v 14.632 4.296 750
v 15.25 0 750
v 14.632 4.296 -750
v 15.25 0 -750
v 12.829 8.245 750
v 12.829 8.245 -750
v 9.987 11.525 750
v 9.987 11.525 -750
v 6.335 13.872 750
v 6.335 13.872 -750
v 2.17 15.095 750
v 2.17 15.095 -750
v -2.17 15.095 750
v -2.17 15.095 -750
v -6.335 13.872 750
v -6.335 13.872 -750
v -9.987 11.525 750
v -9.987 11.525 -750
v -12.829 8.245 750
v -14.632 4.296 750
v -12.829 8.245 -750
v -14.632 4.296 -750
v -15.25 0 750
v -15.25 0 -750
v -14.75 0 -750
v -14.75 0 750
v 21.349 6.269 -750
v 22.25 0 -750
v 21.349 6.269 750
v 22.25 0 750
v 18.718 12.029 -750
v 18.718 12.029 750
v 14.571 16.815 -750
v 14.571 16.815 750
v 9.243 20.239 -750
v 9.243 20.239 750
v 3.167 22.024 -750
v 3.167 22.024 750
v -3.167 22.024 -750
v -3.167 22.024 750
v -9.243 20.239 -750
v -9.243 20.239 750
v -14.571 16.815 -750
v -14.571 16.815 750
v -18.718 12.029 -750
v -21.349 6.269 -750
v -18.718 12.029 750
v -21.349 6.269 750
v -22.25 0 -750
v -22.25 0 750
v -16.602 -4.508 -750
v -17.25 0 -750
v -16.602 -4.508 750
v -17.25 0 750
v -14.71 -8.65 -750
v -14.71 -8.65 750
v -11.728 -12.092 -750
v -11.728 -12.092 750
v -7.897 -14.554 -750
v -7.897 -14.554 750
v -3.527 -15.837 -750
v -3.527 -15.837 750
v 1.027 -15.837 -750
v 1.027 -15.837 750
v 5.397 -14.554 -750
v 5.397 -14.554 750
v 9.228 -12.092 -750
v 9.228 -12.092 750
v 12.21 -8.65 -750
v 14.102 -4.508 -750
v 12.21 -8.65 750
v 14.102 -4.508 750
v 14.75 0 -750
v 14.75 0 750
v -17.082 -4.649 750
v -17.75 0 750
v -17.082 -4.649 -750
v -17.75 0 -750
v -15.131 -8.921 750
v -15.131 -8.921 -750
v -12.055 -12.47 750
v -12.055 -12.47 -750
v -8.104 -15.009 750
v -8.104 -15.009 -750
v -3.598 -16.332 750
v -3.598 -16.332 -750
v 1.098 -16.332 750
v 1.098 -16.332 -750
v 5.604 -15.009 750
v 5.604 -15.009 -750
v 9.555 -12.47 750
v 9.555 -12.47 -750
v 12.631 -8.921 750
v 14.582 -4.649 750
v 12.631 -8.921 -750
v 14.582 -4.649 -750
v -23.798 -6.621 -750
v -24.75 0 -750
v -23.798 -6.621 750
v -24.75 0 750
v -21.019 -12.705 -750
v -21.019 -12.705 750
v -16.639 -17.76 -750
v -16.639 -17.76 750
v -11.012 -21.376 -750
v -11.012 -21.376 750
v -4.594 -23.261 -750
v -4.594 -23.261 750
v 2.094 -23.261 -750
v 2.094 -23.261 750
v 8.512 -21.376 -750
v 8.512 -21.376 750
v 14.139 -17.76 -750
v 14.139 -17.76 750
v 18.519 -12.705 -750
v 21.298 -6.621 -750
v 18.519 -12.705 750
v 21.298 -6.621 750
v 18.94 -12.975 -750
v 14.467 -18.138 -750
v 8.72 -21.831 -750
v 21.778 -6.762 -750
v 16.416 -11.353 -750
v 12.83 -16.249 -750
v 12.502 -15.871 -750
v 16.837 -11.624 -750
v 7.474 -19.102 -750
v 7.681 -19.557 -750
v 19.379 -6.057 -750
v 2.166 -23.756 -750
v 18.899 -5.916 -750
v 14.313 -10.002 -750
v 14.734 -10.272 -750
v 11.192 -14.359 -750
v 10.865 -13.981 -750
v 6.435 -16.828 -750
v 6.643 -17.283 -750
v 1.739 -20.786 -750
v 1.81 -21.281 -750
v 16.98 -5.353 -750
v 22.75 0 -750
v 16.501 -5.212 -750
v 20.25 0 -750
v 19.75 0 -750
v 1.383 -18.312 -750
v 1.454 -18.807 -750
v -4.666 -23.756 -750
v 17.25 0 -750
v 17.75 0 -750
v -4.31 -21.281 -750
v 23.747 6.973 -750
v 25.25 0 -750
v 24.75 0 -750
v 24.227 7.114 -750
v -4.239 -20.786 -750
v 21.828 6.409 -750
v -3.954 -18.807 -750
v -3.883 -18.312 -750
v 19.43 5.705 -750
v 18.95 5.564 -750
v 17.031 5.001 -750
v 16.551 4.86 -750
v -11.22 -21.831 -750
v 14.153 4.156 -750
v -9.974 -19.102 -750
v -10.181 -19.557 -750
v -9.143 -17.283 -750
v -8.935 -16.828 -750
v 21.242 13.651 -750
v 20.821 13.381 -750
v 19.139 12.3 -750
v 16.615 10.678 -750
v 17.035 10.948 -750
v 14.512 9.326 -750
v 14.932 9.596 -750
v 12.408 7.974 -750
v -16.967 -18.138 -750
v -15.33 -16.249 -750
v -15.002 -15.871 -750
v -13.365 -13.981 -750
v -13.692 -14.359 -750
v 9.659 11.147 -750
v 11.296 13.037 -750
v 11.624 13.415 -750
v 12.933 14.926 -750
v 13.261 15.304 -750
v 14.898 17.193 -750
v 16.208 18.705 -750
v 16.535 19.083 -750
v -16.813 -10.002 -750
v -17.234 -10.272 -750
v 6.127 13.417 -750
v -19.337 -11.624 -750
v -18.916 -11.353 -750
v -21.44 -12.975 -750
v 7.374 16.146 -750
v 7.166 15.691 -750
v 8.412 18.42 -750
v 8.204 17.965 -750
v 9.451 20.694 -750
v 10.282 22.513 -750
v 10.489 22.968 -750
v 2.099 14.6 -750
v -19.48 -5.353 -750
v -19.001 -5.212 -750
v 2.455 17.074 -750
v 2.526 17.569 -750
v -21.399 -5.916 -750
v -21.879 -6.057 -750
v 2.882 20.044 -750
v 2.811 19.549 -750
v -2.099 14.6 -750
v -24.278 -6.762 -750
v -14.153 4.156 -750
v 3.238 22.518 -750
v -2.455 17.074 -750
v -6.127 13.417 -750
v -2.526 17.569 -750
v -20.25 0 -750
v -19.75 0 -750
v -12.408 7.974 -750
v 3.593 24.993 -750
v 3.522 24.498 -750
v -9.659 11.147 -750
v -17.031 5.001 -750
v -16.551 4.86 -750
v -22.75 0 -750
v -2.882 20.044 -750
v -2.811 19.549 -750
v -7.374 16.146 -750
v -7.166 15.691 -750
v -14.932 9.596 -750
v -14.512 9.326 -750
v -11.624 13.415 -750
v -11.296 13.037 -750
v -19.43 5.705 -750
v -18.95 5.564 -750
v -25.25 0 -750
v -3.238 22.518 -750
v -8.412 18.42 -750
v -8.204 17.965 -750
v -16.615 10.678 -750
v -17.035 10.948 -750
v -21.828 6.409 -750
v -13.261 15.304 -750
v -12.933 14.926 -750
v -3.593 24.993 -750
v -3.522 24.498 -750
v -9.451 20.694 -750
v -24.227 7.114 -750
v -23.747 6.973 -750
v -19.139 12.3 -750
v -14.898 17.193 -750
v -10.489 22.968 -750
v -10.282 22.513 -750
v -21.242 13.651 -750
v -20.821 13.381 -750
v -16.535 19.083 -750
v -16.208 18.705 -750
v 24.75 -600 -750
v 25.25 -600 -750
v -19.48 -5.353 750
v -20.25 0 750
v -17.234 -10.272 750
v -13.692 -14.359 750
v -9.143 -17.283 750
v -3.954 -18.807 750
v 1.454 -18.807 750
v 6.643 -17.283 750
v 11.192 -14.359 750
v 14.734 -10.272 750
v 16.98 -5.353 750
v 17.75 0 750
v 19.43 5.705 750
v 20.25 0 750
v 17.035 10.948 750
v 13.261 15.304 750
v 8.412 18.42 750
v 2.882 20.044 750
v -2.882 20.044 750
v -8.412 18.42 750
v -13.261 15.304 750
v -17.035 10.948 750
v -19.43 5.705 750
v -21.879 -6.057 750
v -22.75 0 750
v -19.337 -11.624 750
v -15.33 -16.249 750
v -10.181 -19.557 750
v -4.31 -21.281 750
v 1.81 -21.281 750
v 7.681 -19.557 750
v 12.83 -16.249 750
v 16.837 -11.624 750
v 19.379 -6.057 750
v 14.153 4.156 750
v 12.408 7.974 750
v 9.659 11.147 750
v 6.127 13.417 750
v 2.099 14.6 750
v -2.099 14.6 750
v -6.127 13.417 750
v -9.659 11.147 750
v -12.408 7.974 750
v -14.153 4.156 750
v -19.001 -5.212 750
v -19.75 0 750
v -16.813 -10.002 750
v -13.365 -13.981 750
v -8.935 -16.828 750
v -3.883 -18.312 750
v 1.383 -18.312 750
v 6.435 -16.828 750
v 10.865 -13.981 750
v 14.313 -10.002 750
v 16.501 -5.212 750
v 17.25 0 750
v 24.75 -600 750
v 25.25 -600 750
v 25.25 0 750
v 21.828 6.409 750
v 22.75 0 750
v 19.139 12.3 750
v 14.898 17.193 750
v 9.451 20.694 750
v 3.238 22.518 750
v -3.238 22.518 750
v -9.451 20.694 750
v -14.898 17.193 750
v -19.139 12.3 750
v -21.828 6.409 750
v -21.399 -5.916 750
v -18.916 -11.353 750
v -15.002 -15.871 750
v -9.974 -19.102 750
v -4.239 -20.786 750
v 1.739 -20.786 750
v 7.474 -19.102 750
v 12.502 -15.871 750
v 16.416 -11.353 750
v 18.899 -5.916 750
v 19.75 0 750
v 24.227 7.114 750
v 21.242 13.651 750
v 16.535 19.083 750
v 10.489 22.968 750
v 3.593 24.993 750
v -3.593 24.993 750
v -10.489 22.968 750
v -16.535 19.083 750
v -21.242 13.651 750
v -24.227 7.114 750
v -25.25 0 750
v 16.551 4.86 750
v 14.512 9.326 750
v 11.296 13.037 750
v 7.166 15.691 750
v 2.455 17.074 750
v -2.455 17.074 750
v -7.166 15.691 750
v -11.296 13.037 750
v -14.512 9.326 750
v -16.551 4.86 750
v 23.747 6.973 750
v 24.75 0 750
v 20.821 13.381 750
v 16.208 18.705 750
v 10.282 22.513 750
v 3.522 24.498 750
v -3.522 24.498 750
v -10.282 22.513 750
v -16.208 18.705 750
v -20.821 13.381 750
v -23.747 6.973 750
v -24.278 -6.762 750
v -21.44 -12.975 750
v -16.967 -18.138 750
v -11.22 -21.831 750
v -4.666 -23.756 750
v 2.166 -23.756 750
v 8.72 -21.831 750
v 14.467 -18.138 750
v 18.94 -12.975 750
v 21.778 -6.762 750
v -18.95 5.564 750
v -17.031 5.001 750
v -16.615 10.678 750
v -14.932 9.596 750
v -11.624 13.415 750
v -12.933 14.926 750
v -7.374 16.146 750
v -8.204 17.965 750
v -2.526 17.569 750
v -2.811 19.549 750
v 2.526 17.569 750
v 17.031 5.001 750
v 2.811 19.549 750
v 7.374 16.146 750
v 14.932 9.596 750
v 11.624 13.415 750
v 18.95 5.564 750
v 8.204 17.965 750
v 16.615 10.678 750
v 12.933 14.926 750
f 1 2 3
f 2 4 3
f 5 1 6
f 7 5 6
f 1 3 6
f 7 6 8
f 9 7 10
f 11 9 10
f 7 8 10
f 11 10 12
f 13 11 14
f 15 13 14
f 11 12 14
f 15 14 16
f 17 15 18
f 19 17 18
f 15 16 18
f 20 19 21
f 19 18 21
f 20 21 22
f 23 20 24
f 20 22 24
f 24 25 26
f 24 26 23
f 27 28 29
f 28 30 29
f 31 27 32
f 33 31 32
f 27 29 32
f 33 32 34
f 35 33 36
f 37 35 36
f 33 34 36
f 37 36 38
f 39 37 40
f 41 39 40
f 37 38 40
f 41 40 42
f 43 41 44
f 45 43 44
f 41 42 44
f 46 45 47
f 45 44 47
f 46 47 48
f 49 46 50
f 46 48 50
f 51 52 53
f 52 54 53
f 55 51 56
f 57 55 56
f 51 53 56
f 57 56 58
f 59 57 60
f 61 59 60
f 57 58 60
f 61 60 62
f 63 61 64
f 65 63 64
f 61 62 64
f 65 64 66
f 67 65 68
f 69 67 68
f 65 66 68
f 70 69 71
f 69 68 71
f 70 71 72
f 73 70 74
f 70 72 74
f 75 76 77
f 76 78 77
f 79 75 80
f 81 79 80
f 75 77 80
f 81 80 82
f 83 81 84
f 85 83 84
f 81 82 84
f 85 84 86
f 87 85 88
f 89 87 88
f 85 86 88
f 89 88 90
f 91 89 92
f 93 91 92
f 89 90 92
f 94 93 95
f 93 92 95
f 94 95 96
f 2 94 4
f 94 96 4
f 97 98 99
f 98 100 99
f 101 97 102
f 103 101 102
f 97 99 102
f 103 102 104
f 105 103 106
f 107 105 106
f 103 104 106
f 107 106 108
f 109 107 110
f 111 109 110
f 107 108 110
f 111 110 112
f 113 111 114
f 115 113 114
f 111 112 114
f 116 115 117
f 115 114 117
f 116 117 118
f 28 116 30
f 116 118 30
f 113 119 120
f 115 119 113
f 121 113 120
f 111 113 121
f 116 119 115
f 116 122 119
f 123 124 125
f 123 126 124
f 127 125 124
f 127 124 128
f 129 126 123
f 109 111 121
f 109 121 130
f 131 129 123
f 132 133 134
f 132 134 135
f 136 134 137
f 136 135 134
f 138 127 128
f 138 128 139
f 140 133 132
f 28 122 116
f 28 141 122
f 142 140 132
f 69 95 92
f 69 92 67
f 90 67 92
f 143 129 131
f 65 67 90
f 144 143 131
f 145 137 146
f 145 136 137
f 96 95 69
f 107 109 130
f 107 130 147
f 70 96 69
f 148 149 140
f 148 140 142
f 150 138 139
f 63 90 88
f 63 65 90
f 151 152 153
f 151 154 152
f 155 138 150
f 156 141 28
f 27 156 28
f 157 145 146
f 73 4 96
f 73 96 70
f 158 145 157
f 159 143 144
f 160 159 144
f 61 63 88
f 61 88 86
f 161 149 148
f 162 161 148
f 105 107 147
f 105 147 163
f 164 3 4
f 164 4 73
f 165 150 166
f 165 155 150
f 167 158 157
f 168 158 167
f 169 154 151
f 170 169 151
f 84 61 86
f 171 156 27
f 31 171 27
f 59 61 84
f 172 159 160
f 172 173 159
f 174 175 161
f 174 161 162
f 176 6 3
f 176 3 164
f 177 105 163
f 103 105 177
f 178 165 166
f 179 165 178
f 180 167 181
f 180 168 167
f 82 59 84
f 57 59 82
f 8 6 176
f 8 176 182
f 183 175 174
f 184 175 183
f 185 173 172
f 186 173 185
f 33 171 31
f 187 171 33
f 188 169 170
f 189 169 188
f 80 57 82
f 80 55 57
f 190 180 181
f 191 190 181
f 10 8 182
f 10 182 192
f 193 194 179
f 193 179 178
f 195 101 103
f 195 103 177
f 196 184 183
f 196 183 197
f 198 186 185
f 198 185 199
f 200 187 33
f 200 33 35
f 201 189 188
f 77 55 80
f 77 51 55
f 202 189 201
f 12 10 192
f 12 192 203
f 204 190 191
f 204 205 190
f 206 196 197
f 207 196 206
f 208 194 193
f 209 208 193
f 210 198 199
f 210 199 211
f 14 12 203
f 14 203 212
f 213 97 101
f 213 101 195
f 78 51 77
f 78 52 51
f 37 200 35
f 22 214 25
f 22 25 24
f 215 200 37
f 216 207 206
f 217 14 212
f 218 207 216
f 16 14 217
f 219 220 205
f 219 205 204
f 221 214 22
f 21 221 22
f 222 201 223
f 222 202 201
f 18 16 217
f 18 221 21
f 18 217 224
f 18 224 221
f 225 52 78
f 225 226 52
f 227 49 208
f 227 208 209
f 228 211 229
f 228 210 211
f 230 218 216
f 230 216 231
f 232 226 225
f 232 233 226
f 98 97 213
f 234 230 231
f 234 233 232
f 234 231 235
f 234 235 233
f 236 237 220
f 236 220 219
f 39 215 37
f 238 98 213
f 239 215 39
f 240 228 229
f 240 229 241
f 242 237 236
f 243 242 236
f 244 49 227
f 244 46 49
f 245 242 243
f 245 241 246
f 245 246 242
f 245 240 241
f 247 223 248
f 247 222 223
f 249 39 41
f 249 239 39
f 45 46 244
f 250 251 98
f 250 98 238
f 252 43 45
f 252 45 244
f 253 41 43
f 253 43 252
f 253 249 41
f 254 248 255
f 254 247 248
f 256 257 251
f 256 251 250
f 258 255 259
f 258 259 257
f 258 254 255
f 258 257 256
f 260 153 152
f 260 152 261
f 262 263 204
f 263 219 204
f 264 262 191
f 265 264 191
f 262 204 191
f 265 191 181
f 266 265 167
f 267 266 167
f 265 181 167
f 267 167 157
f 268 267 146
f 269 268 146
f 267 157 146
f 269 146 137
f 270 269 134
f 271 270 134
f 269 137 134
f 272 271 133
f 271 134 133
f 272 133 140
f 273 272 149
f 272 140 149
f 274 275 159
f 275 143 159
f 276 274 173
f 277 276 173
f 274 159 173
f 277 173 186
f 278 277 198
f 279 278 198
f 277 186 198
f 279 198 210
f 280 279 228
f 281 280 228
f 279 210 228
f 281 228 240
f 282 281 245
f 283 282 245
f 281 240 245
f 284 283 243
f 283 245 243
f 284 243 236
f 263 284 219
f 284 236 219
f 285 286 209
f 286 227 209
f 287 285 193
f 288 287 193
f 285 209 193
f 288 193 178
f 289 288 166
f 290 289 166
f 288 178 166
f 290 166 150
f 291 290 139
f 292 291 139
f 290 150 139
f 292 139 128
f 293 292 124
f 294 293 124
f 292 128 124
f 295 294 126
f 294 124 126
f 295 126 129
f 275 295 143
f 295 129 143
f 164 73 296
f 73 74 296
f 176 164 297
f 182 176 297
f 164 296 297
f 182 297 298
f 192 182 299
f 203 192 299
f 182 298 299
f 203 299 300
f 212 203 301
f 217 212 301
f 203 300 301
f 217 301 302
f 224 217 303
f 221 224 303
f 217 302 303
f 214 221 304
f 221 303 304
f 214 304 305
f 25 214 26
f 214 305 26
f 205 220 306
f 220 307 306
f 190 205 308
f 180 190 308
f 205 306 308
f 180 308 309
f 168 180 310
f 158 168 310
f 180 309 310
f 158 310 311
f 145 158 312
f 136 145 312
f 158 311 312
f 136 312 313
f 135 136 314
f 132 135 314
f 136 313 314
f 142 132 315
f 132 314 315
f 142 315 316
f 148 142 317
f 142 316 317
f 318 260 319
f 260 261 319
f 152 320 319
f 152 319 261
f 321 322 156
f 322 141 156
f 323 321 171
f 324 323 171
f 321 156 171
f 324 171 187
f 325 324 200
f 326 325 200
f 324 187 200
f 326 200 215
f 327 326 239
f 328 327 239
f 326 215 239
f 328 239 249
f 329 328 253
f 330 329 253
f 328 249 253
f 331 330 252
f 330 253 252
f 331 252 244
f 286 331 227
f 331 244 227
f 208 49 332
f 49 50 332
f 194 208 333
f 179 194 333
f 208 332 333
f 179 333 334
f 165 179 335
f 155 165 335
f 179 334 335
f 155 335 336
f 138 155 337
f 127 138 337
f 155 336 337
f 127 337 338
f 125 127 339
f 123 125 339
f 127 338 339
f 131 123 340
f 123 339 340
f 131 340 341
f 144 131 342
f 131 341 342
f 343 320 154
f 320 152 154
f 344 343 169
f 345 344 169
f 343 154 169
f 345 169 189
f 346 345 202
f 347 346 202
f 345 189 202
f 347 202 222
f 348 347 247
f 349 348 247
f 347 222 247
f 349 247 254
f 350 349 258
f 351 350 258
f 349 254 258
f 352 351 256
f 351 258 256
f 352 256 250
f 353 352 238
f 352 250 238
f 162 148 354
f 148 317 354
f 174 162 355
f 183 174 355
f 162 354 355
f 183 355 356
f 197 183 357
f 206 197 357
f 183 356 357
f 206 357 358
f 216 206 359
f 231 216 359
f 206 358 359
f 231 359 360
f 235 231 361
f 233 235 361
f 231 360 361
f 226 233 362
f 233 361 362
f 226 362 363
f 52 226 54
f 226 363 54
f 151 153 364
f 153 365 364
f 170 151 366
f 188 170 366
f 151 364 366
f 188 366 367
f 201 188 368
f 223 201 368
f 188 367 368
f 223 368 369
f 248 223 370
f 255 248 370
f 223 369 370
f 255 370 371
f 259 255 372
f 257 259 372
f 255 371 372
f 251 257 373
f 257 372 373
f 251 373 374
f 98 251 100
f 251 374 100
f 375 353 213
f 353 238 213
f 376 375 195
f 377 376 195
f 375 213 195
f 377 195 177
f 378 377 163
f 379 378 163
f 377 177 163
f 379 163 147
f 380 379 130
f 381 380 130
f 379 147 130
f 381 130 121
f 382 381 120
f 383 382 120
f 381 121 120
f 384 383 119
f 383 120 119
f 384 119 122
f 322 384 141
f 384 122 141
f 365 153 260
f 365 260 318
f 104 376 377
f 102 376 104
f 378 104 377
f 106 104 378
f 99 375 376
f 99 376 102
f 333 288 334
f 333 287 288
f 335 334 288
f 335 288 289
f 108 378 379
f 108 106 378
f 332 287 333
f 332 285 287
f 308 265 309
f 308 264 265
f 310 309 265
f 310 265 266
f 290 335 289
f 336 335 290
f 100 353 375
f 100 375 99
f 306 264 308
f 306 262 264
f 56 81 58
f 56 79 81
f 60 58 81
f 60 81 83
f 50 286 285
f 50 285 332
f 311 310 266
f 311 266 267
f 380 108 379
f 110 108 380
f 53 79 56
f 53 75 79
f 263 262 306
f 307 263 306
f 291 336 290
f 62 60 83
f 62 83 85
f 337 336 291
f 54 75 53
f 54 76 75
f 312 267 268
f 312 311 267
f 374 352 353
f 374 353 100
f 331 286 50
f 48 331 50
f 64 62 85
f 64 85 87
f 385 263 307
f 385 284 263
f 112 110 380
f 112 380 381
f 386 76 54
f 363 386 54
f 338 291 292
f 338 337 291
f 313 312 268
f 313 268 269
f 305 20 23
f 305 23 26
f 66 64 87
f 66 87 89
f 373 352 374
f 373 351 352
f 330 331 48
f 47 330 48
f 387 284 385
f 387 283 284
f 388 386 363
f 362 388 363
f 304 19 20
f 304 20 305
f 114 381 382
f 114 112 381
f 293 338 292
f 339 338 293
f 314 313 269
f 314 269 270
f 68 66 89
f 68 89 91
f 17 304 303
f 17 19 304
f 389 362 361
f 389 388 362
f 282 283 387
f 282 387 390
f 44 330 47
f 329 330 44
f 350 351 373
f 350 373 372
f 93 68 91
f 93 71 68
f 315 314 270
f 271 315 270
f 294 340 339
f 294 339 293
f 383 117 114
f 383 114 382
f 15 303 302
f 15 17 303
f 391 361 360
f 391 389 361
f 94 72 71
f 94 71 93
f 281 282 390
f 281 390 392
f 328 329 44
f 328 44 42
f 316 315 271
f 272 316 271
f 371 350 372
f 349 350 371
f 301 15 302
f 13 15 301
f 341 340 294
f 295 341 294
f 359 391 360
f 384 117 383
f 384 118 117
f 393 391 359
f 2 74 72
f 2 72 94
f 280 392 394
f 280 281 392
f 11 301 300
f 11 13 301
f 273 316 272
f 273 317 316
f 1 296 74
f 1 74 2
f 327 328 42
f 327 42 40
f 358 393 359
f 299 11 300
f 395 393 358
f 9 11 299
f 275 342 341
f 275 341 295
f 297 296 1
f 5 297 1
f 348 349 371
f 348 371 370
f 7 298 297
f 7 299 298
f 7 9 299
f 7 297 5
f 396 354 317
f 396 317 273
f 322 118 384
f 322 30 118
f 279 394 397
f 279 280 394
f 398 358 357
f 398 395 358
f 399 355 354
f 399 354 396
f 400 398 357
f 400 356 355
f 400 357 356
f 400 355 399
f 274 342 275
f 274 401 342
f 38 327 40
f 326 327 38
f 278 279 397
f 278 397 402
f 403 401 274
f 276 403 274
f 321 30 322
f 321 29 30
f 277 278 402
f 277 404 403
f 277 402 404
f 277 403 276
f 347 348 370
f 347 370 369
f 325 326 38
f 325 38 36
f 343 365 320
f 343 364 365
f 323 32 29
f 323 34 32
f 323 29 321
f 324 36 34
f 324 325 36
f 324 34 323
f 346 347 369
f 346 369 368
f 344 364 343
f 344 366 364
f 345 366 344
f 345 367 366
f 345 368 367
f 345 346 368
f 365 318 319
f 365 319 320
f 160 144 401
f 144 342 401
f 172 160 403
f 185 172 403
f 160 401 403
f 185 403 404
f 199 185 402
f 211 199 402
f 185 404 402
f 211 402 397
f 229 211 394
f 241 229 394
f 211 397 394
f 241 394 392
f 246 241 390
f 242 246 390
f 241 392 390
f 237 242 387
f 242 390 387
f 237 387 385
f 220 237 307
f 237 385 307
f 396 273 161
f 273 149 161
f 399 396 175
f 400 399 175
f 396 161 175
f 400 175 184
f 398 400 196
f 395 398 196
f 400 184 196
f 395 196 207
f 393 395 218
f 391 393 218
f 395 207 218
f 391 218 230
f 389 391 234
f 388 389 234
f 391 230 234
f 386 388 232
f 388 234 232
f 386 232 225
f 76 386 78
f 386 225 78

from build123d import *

# Parameters (mm, degrees)
SKETCH_2_W = 0.5
SKETCH_2_H = 1500


with BuildPart() as part:
    # 扫描1: sweep along a path in 草图1
    with BuildLine(Plane.XY) as sweep_1_path:
        Line((25, -600), (25, 0))
        ThreePointArc((25, 0), (0, 25), (-25, 0))
        ThreePointArc((-25, 0), (-1.25, -23.75), (22.5, 0))
        ThreePointArc((22.5, 0), (0, 22.5), (-22.5, 0))
        ThreePointArc((-22.5, 0), (-1.25, -21.25), (20, 0))
        ThreePointArc((20, 0), (0, 20), (-20, 0))
        ThreePointArc((-20, 0), (-1.25, -18.75), (17.5, 0))
        ThreePointArc((17.5, 0), (0, 17.5), (-17.5, 0))
        ThreePointArc((-17.5, 0), (-1.25, -16.25), (15, 0))
        ThreePointArc((15, 0), (0, 15), (-15, 0))
    # 草图2 → 扫描1 (sweep)
    with BuildSketch(Plane(origin=(0, -600, 0), x_dir=(1, 0, 0), z_dir=(0, 1, 0))):
        with Locations((25, 0)):
            Rectangle(SKETCH_2_W, SKETCH_2_H)
    sweep(path=sweep_1_path.line)


solid = part.part
